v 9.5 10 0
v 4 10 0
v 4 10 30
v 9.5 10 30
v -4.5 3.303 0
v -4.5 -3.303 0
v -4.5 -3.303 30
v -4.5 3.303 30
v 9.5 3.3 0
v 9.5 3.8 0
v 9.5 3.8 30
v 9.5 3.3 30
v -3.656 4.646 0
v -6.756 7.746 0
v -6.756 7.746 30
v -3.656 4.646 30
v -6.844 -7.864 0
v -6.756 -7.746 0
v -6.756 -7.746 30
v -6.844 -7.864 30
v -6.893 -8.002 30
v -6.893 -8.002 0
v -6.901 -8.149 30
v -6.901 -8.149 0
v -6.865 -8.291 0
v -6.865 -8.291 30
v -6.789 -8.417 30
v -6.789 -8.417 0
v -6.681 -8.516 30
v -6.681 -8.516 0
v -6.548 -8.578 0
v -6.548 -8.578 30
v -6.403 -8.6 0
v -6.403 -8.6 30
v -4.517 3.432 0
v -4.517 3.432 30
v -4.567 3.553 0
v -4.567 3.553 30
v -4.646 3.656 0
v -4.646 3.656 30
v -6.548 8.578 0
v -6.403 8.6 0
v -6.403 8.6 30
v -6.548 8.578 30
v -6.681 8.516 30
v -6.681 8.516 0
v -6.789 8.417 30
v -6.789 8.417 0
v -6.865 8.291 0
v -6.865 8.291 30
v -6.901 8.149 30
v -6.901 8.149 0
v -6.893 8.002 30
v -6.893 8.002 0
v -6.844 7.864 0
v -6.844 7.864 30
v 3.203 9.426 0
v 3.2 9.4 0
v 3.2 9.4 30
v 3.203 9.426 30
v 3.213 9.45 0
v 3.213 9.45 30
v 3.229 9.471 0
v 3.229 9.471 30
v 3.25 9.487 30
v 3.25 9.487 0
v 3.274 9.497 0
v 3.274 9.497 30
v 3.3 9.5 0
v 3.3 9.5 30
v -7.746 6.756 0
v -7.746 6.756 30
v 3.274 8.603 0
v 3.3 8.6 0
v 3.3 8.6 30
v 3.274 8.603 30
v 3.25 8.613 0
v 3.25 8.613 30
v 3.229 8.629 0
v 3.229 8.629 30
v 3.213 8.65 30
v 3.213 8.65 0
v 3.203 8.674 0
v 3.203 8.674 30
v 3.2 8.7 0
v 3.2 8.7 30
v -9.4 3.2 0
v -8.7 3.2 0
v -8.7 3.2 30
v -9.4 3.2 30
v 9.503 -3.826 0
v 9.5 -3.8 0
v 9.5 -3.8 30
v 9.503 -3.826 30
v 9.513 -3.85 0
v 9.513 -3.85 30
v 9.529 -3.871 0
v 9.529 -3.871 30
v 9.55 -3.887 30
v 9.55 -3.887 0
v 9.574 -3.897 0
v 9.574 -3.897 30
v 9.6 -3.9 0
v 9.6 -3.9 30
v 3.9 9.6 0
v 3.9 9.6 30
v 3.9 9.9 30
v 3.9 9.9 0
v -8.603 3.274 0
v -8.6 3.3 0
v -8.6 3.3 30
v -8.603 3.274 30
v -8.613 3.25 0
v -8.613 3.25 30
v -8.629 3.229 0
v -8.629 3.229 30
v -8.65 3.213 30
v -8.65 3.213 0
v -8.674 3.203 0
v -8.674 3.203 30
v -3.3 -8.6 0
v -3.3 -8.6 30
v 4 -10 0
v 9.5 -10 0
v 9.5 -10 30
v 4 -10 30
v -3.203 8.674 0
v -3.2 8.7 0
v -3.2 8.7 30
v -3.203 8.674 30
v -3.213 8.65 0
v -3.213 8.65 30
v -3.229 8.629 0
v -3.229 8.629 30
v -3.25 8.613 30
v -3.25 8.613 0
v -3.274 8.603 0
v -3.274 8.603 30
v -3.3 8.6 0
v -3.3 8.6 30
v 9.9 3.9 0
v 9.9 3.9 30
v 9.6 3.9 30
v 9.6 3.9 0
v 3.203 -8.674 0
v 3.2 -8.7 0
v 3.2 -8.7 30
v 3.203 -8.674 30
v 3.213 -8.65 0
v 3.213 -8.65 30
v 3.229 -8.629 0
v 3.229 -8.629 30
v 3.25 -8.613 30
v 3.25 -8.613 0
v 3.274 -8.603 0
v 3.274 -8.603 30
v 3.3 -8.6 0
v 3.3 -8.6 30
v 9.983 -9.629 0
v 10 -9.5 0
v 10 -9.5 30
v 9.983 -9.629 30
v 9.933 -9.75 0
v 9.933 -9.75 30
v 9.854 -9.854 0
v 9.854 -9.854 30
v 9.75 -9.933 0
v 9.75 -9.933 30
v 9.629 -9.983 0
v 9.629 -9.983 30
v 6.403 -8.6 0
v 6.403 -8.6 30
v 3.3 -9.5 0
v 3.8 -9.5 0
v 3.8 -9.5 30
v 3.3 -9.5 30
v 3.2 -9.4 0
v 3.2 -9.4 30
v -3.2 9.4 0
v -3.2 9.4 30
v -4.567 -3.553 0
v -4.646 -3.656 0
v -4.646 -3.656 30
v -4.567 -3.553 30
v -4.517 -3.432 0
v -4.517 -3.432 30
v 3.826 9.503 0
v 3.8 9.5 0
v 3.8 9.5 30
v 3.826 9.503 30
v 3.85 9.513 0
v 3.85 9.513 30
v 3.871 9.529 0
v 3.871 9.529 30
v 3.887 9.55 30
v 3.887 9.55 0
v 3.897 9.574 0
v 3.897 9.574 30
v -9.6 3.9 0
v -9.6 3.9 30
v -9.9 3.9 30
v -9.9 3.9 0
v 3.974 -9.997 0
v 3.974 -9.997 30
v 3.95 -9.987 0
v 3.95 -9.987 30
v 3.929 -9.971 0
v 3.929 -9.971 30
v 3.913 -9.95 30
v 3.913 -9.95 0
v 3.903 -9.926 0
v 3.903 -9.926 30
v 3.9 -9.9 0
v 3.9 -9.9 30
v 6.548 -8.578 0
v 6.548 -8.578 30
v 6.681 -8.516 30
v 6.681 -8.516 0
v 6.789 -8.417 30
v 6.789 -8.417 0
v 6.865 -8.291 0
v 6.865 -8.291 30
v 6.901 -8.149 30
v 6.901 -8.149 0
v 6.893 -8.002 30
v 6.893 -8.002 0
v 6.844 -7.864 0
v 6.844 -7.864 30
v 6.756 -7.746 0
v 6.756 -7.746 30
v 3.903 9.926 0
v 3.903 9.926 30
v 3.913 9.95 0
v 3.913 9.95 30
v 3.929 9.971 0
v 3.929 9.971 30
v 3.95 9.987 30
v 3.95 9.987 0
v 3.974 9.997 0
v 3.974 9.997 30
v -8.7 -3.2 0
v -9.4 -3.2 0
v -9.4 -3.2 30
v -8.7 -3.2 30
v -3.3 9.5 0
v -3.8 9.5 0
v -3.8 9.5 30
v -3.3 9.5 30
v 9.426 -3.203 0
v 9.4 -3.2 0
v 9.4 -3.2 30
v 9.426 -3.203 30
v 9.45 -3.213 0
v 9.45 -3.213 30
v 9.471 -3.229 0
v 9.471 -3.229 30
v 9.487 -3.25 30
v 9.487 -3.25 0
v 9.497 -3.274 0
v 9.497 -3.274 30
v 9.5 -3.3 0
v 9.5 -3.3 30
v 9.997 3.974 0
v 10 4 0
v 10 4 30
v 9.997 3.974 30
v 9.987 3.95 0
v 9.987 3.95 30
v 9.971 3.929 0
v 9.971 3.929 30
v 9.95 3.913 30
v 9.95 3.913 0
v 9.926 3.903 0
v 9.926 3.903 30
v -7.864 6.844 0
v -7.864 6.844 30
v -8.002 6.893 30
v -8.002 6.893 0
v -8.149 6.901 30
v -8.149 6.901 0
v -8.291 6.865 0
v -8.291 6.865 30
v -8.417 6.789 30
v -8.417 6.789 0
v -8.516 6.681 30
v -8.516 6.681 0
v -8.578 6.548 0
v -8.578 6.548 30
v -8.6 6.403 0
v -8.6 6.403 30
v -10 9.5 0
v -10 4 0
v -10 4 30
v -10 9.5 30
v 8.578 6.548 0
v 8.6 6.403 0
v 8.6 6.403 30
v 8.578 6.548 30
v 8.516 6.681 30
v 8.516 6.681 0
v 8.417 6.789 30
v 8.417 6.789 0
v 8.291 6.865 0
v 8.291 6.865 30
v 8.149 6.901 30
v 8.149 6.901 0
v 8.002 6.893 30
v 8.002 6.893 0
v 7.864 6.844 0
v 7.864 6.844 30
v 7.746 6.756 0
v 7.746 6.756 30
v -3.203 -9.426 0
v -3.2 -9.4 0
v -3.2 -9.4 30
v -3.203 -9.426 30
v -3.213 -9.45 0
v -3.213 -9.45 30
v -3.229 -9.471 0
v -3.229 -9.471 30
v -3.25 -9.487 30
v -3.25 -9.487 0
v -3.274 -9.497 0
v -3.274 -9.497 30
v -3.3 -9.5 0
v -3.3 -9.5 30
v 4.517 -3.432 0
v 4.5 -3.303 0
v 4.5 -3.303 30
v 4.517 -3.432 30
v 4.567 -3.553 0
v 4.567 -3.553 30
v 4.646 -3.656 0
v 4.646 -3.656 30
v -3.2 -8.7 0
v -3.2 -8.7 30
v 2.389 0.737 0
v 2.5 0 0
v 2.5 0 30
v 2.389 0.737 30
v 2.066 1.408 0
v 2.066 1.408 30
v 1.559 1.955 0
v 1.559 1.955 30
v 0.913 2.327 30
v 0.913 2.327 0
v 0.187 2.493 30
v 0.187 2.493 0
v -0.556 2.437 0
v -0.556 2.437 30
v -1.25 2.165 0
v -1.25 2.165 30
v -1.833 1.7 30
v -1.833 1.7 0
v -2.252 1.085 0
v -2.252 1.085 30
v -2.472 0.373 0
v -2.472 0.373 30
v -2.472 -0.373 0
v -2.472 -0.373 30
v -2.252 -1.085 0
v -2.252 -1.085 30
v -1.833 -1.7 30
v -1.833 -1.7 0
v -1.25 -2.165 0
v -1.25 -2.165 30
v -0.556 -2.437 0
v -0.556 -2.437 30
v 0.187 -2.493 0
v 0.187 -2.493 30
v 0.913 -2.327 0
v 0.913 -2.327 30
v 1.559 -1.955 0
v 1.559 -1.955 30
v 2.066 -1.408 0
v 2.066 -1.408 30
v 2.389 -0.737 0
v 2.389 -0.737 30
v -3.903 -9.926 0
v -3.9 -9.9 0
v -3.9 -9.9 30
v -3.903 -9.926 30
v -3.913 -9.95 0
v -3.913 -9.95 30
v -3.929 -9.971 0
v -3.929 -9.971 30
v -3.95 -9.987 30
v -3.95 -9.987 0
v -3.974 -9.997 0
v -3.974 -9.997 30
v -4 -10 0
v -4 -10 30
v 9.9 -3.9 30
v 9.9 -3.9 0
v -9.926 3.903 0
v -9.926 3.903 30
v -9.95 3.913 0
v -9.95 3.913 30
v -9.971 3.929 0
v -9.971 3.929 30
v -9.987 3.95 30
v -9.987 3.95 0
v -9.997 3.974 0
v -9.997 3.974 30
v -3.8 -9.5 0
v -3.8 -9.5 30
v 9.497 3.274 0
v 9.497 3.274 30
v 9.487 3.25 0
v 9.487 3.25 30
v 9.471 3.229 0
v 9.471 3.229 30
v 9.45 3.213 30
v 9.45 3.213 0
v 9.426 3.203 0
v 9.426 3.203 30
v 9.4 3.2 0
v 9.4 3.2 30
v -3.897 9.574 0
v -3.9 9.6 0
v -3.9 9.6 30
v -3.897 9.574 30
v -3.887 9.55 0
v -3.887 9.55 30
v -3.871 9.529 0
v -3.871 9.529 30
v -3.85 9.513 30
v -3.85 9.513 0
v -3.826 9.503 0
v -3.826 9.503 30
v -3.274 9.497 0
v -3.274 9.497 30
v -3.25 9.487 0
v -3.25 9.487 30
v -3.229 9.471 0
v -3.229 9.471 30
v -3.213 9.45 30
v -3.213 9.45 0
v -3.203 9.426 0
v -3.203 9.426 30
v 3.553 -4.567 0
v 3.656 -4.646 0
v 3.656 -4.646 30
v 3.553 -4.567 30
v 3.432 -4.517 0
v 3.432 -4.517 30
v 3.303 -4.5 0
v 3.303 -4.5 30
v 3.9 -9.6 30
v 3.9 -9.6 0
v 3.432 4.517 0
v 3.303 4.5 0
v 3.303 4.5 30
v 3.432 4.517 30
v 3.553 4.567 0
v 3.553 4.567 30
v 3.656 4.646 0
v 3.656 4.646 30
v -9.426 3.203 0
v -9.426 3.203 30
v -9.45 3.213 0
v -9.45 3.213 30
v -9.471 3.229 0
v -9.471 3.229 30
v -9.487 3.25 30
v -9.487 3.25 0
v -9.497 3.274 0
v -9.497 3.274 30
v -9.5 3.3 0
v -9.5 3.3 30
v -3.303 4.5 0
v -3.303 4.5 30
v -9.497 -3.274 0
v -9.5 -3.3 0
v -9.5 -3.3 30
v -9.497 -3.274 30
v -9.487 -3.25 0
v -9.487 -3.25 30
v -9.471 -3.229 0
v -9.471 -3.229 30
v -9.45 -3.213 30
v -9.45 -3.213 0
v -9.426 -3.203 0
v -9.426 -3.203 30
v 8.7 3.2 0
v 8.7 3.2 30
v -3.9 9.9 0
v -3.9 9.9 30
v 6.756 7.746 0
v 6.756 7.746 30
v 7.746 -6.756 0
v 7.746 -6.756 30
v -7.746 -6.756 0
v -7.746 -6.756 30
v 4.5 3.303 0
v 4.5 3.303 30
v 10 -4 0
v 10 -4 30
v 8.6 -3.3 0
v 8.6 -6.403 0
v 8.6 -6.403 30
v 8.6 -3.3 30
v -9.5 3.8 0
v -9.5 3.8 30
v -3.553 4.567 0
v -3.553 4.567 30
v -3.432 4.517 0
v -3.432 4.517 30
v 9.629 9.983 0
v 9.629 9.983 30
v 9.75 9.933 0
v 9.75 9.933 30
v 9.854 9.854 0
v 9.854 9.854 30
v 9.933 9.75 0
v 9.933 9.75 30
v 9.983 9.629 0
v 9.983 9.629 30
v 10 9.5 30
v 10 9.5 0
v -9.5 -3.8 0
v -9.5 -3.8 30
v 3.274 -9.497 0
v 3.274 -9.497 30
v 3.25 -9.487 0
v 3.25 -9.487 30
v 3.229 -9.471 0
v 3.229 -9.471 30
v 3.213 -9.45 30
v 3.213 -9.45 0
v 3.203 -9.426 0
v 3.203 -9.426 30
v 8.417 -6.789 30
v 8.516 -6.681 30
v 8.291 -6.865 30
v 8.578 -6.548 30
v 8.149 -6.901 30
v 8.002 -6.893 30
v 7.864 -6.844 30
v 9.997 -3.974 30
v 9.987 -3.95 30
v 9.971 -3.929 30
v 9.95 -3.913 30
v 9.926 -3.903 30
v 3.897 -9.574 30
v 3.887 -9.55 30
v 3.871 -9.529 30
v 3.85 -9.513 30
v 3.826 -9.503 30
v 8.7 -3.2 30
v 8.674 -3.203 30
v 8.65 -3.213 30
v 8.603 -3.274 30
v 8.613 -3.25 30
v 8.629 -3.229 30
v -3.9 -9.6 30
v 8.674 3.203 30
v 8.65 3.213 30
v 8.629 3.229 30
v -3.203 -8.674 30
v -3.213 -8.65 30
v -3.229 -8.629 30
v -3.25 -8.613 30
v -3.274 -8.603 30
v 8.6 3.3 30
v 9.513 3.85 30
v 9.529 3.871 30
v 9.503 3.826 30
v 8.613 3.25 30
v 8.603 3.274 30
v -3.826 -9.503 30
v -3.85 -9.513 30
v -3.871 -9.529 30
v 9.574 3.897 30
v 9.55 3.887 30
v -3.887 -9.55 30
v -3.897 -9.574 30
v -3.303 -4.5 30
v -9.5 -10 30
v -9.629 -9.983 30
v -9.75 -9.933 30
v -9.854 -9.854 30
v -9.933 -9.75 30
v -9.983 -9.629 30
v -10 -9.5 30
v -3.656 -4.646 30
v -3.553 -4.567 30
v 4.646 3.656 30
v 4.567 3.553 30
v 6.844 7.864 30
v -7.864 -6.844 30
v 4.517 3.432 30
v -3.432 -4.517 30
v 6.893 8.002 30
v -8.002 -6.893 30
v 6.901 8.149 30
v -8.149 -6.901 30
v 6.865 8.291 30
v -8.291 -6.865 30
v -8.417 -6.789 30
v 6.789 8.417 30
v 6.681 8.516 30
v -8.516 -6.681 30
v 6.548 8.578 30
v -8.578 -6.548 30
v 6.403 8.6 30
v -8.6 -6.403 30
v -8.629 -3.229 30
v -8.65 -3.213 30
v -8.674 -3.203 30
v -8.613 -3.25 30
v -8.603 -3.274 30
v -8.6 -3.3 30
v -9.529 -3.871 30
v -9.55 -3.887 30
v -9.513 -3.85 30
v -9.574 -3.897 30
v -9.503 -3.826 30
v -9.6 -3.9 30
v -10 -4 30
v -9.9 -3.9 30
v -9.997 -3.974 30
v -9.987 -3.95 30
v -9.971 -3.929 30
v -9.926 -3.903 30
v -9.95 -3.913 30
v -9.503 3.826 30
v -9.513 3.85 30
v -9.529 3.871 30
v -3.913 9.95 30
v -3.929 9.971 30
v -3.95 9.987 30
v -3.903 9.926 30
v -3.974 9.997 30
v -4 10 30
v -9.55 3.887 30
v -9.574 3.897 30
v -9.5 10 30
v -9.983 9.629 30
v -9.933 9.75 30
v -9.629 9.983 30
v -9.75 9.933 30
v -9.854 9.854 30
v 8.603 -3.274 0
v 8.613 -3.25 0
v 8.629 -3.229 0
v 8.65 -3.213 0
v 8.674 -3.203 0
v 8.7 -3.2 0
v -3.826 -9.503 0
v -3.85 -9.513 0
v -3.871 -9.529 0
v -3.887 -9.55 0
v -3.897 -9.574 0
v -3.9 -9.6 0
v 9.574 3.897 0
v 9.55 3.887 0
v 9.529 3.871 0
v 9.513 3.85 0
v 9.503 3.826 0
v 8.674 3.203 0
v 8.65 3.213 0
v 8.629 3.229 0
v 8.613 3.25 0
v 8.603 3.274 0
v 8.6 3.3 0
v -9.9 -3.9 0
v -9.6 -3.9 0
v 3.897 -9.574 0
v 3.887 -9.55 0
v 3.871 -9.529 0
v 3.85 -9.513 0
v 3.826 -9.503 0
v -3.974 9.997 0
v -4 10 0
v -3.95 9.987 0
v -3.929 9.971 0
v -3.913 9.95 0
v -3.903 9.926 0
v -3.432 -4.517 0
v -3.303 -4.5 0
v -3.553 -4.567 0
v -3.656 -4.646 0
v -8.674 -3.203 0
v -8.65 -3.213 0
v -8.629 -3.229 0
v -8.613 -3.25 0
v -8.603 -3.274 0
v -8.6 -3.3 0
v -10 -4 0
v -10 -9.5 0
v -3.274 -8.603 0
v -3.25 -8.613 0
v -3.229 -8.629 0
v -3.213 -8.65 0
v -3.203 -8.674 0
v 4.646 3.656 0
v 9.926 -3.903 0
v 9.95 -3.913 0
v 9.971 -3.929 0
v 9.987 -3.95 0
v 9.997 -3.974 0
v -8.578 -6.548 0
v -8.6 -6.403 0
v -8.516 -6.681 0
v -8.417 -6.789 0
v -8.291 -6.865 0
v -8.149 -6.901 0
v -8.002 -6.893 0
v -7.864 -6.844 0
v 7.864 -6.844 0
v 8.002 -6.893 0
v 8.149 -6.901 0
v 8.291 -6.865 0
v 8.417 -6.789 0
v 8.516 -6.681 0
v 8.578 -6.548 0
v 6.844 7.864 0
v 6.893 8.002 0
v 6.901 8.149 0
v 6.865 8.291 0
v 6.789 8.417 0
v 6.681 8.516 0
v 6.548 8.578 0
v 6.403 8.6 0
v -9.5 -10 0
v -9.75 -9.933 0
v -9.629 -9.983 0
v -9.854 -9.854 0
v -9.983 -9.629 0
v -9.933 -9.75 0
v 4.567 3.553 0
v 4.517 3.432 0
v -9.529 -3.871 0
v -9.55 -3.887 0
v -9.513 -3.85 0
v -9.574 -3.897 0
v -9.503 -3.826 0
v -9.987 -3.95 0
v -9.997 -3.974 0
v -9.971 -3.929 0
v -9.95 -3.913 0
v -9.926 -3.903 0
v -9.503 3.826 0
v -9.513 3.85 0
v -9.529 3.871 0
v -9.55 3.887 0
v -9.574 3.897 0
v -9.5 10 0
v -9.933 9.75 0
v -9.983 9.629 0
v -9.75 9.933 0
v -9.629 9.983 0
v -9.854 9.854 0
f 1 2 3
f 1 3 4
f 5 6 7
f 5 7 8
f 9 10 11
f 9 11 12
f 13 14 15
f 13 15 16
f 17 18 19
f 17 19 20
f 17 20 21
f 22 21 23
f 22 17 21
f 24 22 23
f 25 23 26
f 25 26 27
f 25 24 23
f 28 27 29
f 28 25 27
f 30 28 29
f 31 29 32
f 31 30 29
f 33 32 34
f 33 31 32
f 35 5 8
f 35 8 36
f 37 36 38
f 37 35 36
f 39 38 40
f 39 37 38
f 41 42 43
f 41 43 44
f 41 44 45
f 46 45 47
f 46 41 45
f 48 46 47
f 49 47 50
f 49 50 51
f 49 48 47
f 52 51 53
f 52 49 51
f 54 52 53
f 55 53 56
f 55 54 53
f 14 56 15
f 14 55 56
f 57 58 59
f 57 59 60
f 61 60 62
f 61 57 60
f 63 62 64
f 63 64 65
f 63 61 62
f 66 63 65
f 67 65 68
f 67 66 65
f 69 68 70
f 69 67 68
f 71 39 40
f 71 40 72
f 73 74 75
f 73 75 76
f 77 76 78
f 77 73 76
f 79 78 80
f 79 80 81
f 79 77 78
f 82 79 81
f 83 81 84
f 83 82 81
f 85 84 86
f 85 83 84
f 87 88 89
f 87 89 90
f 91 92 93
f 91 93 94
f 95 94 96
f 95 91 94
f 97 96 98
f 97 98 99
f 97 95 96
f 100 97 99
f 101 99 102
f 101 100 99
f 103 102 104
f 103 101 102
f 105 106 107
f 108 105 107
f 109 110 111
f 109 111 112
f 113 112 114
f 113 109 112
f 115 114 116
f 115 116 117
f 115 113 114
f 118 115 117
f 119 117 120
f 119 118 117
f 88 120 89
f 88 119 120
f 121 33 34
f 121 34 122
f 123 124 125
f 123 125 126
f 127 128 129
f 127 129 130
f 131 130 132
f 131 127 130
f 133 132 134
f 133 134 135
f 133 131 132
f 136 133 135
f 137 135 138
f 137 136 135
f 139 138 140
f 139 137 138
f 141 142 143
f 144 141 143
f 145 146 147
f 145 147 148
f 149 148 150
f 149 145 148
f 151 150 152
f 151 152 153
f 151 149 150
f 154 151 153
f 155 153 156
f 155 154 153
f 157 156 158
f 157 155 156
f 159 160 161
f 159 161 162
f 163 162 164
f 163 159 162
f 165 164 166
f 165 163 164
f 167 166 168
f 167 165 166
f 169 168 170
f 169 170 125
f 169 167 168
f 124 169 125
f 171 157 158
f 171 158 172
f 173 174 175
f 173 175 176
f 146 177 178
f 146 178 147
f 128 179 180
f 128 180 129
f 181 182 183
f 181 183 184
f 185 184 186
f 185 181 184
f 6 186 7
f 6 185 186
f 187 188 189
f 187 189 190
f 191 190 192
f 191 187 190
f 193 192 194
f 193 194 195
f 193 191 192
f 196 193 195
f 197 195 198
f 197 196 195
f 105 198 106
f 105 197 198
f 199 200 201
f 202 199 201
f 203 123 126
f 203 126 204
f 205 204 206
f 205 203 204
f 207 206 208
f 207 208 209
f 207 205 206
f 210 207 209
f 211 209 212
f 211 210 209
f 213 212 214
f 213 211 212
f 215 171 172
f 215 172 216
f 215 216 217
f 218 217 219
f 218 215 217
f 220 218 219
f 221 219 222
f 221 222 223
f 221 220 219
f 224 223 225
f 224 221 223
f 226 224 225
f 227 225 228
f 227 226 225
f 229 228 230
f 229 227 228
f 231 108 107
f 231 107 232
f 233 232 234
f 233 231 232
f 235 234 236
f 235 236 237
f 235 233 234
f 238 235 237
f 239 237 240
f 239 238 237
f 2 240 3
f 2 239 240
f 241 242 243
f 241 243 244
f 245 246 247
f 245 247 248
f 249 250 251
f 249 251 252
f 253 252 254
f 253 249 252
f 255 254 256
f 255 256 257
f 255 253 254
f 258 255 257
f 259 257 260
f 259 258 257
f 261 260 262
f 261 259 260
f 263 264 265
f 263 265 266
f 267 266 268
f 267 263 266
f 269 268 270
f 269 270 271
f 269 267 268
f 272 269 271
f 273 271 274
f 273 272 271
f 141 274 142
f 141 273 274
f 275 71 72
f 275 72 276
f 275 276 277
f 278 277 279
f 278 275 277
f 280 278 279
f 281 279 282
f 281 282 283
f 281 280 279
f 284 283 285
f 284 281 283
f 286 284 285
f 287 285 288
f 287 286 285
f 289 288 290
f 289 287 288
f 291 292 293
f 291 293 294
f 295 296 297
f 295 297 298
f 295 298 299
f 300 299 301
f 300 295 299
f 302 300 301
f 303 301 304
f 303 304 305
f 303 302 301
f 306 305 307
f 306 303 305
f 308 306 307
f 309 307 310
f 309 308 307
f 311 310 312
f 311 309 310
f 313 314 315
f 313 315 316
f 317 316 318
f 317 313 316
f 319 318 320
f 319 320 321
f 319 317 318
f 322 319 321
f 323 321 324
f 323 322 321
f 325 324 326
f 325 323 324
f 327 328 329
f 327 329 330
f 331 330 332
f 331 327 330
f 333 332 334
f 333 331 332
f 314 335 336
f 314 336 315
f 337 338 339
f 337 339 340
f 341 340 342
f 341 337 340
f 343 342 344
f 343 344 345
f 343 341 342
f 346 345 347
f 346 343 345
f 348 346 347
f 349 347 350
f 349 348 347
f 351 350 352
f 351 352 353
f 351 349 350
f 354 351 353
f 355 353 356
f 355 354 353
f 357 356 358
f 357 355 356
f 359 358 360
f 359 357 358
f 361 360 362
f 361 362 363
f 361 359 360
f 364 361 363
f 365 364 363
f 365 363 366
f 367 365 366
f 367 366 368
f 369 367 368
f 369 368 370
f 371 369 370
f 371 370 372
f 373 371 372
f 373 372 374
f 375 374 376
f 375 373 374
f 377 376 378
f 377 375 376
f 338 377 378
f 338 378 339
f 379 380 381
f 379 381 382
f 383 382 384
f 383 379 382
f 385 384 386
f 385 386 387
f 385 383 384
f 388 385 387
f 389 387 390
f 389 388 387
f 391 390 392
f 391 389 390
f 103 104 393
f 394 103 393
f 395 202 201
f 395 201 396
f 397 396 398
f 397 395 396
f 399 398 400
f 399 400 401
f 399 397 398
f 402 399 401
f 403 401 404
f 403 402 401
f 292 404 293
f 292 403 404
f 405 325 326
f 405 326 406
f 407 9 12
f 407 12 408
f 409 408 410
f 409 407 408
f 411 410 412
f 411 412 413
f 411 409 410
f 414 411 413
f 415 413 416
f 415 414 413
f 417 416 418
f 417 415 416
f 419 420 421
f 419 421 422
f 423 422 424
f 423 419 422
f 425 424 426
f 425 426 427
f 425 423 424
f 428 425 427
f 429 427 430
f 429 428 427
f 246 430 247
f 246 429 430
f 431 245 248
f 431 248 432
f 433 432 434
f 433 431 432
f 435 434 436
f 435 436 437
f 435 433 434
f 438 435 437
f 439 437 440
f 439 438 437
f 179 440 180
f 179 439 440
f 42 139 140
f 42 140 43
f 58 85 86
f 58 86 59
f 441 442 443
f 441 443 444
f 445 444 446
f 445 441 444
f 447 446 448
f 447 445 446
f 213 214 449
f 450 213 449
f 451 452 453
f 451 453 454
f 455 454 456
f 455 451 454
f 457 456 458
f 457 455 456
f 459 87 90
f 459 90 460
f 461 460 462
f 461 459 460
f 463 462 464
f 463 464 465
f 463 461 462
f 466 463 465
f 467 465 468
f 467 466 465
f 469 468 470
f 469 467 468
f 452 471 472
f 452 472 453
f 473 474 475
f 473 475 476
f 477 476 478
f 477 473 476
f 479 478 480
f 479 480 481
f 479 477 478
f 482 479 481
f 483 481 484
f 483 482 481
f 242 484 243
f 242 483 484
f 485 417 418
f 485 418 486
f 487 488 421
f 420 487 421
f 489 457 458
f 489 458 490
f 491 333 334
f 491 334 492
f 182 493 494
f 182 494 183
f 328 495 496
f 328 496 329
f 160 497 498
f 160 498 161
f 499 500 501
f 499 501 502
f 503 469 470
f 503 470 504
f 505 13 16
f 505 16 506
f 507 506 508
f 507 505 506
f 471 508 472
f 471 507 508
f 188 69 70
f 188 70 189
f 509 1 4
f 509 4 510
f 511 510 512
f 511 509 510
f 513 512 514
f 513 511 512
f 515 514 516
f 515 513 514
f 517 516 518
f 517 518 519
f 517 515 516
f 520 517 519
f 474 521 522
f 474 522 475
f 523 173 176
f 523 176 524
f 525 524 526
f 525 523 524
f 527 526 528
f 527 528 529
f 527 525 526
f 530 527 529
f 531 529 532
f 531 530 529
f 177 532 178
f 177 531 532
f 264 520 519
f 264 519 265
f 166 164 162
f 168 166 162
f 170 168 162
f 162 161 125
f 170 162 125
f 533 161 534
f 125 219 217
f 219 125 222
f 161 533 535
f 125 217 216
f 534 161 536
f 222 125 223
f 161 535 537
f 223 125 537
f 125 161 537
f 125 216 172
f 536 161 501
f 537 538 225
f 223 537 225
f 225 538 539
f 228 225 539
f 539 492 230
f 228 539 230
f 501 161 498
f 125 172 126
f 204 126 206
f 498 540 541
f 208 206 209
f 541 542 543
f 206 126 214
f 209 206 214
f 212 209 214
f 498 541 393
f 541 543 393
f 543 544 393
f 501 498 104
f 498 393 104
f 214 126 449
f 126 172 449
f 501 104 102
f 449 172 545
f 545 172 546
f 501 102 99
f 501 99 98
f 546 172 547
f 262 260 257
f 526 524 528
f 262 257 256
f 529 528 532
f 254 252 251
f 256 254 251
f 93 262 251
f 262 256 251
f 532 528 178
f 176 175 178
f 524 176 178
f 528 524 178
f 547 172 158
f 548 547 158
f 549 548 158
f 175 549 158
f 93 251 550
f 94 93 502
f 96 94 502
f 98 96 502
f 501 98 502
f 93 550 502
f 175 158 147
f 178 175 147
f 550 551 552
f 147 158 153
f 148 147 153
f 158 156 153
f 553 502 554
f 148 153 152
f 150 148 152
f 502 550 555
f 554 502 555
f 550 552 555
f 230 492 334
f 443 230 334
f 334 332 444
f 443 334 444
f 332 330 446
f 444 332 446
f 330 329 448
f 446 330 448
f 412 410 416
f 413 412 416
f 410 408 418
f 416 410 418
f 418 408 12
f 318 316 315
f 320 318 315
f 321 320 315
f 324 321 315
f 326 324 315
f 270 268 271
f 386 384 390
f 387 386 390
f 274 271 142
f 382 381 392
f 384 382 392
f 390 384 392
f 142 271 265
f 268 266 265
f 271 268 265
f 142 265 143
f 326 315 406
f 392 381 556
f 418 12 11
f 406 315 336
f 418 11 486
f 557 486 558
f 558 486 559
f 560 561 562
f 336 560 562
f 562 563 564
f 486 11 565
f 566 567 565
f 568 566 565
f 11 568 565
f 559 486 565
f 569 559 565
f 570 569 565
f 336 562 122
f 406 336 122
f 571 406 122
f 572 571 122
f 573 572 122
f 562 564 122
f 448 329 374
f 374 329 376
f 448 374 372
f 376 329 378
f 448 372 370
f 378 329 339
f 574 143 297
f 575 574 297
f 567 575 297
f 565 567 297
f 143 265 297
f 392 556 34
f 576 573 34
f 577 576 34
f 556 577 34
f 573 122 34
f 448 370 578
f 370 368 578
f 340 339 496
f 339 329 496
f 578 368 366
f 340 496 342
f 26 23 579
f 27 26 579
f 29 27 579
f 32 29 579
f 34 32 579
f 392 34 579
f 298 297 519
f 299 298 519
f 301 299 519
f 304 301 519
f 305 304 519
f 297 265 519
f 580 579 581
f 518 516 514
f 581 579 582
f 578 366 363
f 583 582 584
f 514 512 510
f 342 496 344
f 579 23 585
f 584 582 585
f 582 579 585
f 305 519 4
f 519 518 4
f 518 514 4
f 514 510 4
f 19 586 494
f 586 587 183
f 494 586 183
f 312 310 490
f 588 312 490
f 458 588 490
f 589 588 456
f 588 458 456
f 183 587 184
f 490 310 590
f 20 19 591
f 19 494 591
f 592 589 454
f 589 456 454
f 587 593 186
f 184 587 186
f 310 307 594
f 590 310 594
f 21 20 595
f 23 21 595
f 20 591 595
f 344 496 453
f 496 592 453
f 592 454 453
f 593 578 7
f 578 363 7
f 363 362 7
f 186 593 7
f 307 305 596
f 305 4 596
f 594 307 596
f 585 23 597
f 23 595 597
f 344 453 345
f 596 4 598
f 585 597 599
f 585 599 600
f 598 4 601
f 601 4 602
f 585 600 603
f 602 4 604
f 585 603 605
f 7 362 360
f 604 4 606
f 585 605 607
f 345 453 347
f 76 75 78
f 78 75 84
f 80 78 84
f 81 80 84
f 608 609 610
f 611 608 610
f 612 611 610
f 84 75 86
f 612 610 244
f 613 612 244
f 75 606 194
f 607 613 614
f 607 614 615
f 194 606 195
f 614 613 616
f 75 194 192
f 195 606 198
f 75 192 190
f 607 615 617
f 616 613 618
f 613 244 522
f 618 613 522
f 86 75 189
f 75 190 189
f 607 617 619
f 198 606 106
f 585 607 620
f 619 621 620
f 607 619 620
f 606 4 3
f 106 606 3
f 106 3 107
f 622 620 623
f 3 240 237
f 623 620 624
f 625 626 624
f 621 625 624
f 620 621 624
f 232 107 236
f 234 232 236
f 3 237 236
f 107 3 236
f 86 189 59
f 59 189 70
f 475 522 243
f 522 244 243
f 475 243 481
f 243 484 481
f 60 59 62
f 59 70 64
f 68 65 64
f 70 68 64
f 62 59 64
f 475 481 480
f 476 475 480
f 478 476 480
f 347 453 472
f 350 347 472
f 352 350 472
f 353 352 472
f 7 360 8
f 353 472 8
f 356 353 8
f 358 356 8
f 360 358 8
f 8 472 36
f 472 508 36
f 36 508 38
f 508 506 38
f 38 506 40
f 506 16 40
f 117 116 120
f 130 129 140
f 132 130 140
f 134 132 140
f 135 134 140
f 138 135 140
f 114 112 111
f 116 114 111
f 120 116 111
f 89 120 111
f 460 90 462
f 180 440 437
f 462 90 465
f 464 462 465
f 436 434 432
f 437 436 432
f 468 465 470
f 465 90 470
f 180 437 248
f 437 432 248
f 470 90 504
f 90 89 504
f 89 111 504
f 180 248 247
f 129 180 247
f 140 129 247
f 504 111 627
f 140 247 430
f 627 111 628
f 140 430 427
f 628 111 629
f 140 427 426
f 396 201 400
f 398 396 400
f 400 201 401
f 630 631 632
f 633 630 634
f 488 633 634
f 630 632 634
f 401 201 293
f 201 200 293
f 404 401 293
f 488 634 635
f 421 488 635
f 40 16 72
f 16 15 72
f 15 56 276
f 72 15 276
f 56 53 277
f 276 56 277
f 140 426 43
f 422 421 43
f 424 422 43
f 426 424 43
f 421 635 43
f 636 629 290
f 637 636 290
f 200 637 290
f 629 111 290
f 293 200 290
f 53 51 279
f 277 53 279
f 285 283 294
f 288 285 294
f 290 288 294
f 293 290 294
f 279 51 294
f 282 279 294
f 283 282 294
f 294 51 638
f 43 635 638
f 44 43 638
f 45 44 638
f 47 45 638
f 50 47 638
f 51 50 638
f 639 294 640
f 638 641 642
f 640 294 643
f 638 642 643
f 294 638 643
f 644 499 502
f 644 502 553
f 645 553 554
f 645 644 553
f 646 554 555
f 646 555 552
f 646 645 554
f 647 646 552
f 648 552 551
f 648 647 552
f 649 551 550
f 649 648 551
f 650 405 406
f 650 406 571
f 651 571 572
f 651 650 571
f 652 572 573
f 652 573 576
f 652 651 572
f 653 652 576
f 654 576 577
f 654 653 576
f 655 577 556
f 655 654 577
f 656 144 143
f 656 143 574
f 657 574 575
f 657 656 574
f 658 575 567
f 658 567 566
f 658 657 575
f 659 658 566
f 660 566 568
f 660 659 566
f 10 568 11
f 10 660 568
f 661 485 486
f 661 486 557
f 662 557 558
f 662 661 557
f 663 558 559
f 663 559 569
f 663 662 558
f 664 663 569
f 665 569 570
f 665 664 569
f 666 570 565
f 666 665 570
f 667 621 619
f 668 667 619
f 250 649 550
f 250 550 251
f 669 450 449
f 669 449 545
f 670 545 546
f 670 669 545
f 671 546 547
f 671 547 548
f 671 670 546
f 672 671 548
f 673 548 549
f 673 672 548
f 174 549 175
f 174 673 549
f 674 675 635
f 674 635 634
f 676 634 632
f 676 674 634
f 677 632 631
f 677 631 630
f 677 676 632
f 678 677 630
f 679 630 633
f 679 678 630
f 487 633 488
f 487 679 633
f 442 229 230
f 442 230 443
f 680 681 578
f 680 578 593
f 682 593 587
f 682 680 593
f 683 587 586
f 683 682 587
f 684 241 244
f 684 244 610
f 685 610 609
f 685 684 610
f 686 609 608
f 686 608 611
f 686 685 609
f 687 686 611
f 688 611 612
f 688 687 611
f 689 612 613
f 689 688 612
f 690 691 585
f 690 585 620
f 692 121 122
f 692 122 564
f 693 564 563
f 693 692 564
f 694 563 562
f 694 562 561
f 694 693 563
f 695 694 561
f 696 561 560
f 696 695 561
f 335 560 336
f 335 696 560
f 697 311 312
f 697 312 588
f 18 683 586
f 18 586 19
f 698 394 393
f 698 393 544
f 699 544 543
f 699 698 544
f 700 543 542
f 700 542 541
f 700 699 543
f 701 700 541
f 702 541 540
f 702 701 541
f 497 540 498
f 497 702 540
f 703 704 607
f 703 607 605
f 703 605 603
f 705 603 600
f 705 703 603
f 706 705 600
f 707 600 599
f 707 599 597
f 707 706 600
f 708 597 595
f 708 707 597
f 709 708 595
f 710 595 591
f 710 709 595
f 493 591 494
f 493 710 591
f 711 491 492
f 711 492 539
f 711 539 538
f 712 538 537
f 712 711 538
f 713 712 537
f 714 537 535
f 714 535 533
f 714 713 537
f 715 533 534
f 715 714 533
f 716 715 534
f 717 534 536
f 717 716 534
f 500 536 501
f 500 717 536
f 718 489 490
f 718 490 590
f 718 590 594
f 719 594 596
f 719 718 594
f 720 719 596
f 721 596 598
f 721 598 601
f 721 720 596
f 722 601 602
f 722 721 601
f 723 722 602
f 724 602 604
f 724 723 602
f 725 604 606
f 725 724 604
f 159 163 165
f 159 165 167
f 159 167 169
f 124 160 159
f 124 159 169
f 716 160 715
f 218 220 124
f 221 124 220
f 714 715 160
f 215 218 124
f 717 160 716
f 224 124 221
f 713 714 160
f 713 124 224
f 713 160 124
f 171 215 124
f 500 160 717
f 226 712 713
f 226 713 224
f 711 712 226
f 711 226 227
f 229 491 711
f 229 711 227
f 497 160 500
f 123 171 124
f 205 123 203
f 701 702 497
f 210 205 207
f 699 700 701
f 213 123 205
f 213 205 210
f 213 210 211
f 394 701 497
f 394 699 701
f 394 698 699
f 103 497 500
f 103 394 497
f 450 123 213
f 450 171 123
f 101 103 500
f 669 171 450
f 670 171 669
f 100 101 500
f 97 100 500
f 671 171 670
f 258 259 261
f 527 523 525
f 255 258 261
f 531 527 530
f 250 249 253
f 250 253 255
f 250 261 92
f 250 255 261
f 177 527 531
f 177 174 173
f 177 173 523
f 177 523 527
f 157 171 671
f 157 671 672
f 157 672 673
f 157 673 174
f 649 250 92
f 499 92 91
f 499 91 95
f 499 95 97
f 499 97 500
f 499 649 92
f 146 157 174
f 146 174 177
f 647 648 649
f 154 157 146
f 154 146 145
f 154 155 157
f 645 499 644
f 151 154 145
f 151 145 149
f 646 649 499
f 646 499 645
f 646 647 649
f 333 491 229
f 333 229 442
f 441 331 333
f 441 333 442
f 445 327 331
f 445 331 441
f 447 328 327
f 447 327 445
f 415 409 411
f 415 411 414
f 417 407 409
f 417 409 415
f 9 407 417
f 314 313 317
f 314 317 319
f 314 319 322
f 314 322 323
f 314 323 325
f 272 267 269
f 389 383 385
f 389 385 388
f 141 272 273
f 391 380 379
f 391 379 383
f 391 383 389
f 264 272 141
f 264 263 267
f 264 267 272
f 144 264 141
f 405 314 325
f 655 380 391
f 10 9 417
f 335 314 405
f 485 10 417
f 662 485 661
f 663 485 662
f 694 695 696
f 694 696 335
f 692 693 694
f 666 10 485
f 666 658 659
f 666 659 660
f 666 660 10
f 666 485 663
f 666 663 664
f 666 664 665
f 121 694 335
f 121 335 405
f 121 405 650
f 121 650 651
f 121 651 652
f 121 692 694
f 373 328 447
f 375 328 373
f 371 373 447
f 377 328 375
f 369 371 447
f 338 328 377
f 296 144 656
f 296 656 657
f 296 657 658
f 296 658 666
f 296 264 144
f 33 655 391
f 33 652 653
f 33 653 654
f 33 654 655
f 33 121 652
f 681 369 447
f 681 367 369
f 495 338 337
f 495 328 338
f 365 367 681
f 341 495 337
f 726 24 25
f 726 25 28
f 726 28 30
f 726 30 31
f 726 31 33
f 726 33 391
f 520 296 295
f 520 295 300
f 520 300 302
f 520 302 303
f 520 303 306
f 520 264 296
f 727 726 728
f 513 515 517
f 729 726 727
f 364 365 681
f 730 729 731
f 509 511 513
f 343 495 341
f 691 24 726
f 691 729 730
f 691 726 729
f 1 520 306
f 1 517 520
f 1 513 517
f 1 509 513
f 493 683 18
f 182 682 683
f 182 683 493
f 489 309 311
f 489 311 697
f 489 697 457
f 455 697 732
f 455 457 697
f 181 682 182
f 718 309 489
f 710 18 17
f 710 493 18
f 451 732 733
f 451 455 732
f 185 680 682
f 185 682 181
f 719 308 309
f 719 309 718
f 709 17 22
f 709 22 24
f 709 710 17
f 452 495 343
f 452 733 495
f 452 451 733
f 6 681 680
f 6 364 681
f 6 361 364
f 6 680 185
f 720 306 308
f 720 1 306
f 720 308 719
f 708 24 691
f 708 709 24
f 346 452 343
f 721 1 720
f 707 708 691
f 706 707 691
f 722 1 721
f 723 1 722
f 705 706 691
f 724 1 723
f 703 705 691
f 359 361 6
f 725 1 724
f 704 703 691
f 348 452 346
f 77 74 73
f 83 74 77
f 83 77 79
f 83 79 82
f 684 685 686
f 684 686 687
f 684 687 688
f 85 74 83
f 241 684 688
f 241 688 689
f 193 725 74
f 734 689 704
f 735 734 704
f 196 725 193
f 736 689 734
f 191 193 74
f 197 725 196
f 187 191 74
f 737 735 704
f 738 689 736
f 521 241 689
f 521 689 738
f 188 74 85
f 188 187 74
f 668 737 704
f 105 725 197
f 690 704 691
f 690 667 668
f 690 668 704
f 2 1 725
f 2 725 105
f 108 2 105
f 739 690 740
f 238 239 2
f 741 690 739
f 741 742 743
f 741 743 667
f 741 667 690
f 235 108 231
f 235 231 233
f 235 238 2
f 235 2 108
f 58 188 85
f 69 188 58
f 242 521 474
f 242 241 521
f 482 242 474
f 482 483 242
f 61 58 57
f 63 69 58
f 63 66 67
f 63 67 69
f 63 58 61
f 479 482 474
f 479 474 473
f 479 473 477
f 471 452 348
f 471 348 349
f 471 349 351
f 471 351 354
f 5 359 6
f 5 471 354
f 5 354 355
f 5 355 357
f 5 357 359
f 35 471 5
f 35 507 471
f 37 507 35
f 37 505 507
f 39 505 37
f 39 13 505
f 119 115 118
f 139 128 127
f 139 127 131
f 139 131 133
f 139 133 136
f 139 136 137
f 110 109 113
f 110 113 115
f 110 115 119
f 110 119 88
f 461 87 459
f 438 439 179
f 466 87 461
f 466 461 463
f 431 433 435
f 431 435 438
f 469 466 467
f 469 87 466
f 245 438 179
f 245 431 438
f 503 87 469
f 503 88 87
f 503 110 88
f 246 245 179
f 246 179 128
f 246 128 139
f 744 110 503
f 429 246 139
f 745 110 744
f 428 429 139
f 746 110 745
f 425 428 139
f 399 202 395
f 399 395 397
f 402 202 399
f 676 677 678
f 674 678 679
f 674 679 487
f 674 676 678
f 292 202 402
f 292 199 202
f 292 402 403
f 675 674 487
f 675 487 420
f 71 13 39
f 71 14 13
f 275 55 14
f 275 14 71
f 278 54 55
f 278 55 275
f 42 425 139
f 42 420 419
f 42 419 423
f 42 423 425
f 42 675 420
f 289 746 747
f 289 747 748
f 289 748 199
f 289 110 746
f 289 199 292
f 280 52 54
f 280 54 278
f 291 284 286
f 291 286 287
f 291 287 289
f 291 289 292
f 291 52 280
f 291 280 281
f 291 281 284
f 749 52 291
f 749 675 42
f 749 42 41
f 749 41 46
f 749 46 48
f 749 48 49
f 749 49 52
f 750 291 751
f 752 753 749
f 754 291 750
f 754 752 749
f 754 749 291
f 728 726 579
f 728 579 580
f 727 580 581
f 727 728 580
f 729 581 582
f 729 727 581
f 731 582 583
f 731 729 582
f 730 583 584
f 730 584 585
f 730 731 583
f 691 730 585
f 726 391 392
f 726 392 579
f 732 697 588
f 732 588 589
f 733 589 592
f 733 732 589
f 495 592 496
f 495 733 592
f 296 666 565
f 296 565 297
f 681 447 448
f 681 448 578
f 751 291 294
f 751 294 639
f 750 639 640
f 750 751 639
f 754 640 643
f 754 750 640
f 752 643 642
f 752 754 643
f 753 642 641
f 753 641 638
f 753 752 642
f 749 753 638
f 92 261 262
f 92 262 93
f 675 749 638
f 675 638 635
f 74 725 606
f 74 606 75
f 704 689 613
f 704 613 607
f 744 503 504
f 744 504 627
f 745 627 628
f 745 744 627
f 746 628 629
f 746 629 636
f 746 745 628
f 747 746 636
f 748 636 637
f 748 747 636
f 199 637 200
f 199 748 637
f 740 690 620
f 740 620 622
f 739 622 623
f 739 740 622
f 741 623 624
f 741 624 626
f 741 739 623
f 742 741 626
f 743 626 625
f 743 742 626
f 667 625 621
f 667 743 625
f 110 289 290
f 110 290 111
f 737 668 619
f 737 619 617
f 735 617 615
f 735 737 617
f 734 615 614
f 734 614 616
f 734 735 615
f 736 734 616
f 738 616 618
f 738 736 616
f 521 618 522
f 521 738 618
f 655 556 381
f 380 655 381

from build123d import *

# Parameters (mm, degrees)
IZIM1_R                     = 2.5
Y_KSEKLIK_EKSTR_ZYON1_DEPTH = 30


with BuildPart() as part:
    # Çizim1 → Yükseklik-Ekstrüzyon1 (new body)
    with BuildSketch(Plane.XY):
        with BuildLine():
            Line((8.6, 3.3), (8.6, 6.402943725))
            ThreePointArc((8.6, 6.402943725), (8.291341716, 6.864883491), (7.746446609, 6.756497116))
            Line((7.746446609, 6.756497116), (4.646446609, 3.656497116))
            ThreePointArc((4.646446609, 3.656497116), (4.538060234, 3.494285441), (4.5, 3.302943725))
            Line((4.5, 3.302943725), (4.5, 0))
            Line((4.5, 0), (4.5, -3.302943725))
            ThreePointArc((4.5, -3.302943725), (4.538060234, -3.494285441), (4.646446609, -3.656497116))
            Line((4.646446609, -3.656497116), (7.746446609, -6.756497116))
            ThreePointArc((7.746446609, -6.756497116), (8.291341716, -6.864883491), (8.6, -6.402943725))
            Line((8.6, -6.402943725), (8.6, -3.3))
            ThreePointArc((8.6, -3.3), (8.629289322, -3.229289322), (8.7, -3.2))
            Line((8.7, -3.2), (9.4, -3.2))
            ThreePointArc((9.4, -3.2), (9.470710678, -3.229289322), (9.5, -3.3))
            Line((9.5, -3.3), (9.5, -3.8))
            ThreePointArc((9.5, -3.8), (9.529289322, -3.870710678), (9.6, -3.9))
            Line((9.6, -3.9), (9.9, -3.9))
            ThreePointArc((9.9, -3.9), (9.970710678, -3.929289322), (10, -4))
            Line((10, -4), (10, -9.5))
            ThreePointArc((10, -9.5), (9.853553391, -9.853553391), (9.5, -10))
            Line((9.5, -10), (4, -10))
            ThreePointArc((4, -10), (3.929289322, -9.970710678), (3.9, -9.9))
            Line((3.9, -9.9), (3.9, -9.6))
            ThreePointArc((3.9, -9.6), (3.870710678, -9.529289322), (3.8, -9.5))
            Line((3.8, -9.5), (3.3, -9.5))
            ThreePointArc((3.3, -9.5), (3.229289322, -9.470710678), (3.2, -9.4))
            Line((3.2, -9.4), (3.2, -8.7))
            ThreePointArc((3.2, -8.7), (3.229289322, -8.629289322), (3.3, -8.6))
            Line((3.3, -8.6), (6.402943725, -8.6))
            ThreePointArc((6.402943725, -8.6), (6.864883491, -8.291341716), (6.756497116, -7.746446609))
            Line((6.756497116, -7.746446609), (3.656497116, -4.646446609))
            ThreePointArc((3.656497116, -4.646446609), (3.494285441, -4.538060234), (3.302943725, -4.5))
            Line((3.302943725, -4.5), (0, -4.5))
            Line((0, -4.5), (-3.302943725, -4.5))
            ThreePointArc((-3.302943725, -4.5), (-3.494285441, -4.538060234), (-3.656497116, -4.646446609))
            Line((-3.656497116, -4.646446609), (-6.756497116, -7.746446609))
            ThreePointArc((-6.756497116, -7.746446609), (-6.864883491, -8.291341716), (-6.402943725, -8.6))
            Line((-6.402943725, -8.6), (-3.3, -8.6))
            ThreePointArc((-3.3, -8.6), (-3.229289322, -8.629289322), (-3.2, -8.7))
            Line((-3.2, -8.7), (-3.2, -9.4))
            ThreePointArc((-3.2, -9.4), (-3.229289322, -9.470710678), (-3.3, -9.5))
            Line((-3.3, -9.5), (-3.8, -9.5))
            ThreePointArc((-3.8, -9.5), (-3.870710678, -9.529289322), (-3.9, -9.6))
            Line((-3.9, -9.6), (-3.9, -9.9))
            ThreePointArc((-3.9, -9.9), (-3.929289322, -9.970710678), (-4, -10))
            Line((-4, -10), (-9.5, -10))
            ThreePointArc((-9.5, -10), (-9.853553391, -9.853553391), (-10, -9.5))
            Line((-10, -9.5), (-10, -4))
            ThreePointArc((-10, -4), (-9.970710678, -3.929289322), (-9.9, -3.9))
            Line((-9.9, -3.9), (-9.6, -3.9))
            ThreePointArc((-9.6, -3.9), (-9.529289322, -3.870710678), (-9.5, -3.8))
            Line((-9.5, -3.8), (-9.5, -3.3))
            ThreePointArc((-9.5, -3.3), (-9.470710678, -3.229289322), (-9.4, -3.2))
            Line((-9.4, -3.2), (-8.7, -3.2))
            ThreePointArc((-8.7, -3.2), (-8.629289322, -3.229289322), (-8.6, -3.3))
            Line((-8.6, -3.3), (-8.6, -6.402943725))
            ThreePointArc((-8.6, -6.402943725), (-8.291341716, -6.864883491), (-7.746446609, -6.756497116))
            Line((-7.746446609, -6.756497116), (-4.646446609, -3.656497116))
            ThreePointArc((-4.646446609, -3.656497116), (-4.538060234, -3.494285441), (-4.5, -3.302943725))
            Line((-4.5, -3.302943725), (-4.5, 0))
            Line((-4.5, 0), (-4.5, 3.302943725))
            ThreePointArc((-4.5, 3.302943725), (-4.538060234, 3.494285441), (-4.646446609, 3.656497116))
            Line((-4.646446609, 3.656497116), (-7.746446609, 6.756497116))
            ThreePointArc((-7.746446609, 6.756497116), (-8.291341716, 6.864883491), (-8.6, 6.402943725))
            Line((-8.6, 6.402943725), (-8.6, 3.3))
            ThreePointArc((-8.6, 3.3), (-8.629289322, 3.229289322), (-8.7, 3.2))
            Line((-8.7, 3.2), (-9.4, 3.2))
            ThreePointArc((-9.4, 3.2), (-9.470710678, 3.229289322), (-9.5, 3.3))
            Line((-9.5, 3.3), (-9.5, 3.8))
            ThreePointArc((-9.5, 3.8), (-9.529289322, 3.870710678), (-9.6, 3.9))
            Line((-9.6, 3.9), (-9.9, 3.9))
            ThreePointArc((-9.9, 3.9), (-9.970710678, 3.929289322), (-10, 4))
            Line((-10, 4), (-10, 9.5))
            ThreePointArc((-10, 9.5), (-9.853553391, 9.853553391), (-9.5, 10))
            Line((-9.5, 10), (-4, 10))
            ThreePointArc((-4, 10), (-3.929289322, 9.970710678), (-3.9, 9.9))
            Line((-3.9, 9.9), (-3.9, 9.6))
            ThreePointArc((-3.9, 9.6), (-3.870710678, 9.529289322), (-3.8, 9.5))
            Line((-3.8, 9.5), (-3.3, 9.5))
            ThreePointArc((-3.3, 9.5), (-3.229289322, 9.470710678), (-3.2, 9.4))
            Line((-3.2, 9.4), (-3.2, 8.7))
            ThreePointArc((-3.2, 8.7), (-3.229289322, 8.629289322), (-3.3, 8.6))
            Line((-3.3, 8.6), (-6.402943725, 8.6))
            ThreePointArc((-6.402943725, 8.6), (-6.864883491, 8.291341716), (-6.756497116, 7.746446609))
            Line((-6.756497116, 7.746446609), (-3.656497116, 4.646446609))
            ThreePointArc((-3.656497116, 4.646446609), (-3.494285441, 4.538060234), (-3.302943725, 4.5))
            Line((-3.302943725, 4.5), (0, 4.5))
            Line((0, 4.5), (3.302943725, 4.5))
            ThreePointArc((3.302943725, 4.5), (3.494285441, 4.538060234), (3.656497116, 4.646446609))
            Line((3.656497116, 4.646446609), (6.756497116, 7.746446609))
            ThreePointArc((6.756497116, 7.746446609), (6.864883491, 8.291341716), (6.402943725, 8.6))
            Line((6.402943725, 8.6), (3.3, 8.6))
            ThreePointArc((3.3, 8.6), (3.229289322, 8.629289322), (3.2, 8.7))
            Line((3.2, 8.7), (3.2, 9.4))
            ThreePointArc((3.2, 9.4), (3.229289322, 9.470710678), (3.3, 9.5))
            Line((3.3, 9.5), (3.8, 9.5))
            ThreePointArc((3.8, 9.5), (3.870710678, 9.529289322), (3.9, 9.6))
            Line((3.9, 9.6), (3.9, 9.9))
            ThreePointArc((3.9, 9.9), (3.929289322, 9.970710678), (4, 10))
            Line((4, 10), (9.5, 10))
            ThreePointArc((9.5, 10), (9.853553391, 9.853553391), (10, 9.5))
            Line((10, 9.5), (10, 4))
            ThreePointArc((10, 4), (9.970710678, 3.929289322), (9.9, 3.9))
            Line((9.9, 3.9), (9.6, 3.9))
            ThreePointArc((9.6, 3.9), (9.529289322, 3.870710678), (9.5, 3.8))
            Line((9.5, 3.8), (9.5, 3.3))
            ThreePointArc((9.5, 3.3), (9.470710678, 3.229289322), (9.4, 3.2))
            Line((9.4, 3.2), (8.7, 3.2))
            ThreePointArc((8.7, 3.2), (8.629289322, 3.229289322), (8.6, 3.3))
        make_face()
        Circle(IZIM1_R, mode=Mode.SUBTRACT)
    extrude(amount=Y_KSEKLIK_EKSTR_ZYON1_DEPTH)


solid = part.part
